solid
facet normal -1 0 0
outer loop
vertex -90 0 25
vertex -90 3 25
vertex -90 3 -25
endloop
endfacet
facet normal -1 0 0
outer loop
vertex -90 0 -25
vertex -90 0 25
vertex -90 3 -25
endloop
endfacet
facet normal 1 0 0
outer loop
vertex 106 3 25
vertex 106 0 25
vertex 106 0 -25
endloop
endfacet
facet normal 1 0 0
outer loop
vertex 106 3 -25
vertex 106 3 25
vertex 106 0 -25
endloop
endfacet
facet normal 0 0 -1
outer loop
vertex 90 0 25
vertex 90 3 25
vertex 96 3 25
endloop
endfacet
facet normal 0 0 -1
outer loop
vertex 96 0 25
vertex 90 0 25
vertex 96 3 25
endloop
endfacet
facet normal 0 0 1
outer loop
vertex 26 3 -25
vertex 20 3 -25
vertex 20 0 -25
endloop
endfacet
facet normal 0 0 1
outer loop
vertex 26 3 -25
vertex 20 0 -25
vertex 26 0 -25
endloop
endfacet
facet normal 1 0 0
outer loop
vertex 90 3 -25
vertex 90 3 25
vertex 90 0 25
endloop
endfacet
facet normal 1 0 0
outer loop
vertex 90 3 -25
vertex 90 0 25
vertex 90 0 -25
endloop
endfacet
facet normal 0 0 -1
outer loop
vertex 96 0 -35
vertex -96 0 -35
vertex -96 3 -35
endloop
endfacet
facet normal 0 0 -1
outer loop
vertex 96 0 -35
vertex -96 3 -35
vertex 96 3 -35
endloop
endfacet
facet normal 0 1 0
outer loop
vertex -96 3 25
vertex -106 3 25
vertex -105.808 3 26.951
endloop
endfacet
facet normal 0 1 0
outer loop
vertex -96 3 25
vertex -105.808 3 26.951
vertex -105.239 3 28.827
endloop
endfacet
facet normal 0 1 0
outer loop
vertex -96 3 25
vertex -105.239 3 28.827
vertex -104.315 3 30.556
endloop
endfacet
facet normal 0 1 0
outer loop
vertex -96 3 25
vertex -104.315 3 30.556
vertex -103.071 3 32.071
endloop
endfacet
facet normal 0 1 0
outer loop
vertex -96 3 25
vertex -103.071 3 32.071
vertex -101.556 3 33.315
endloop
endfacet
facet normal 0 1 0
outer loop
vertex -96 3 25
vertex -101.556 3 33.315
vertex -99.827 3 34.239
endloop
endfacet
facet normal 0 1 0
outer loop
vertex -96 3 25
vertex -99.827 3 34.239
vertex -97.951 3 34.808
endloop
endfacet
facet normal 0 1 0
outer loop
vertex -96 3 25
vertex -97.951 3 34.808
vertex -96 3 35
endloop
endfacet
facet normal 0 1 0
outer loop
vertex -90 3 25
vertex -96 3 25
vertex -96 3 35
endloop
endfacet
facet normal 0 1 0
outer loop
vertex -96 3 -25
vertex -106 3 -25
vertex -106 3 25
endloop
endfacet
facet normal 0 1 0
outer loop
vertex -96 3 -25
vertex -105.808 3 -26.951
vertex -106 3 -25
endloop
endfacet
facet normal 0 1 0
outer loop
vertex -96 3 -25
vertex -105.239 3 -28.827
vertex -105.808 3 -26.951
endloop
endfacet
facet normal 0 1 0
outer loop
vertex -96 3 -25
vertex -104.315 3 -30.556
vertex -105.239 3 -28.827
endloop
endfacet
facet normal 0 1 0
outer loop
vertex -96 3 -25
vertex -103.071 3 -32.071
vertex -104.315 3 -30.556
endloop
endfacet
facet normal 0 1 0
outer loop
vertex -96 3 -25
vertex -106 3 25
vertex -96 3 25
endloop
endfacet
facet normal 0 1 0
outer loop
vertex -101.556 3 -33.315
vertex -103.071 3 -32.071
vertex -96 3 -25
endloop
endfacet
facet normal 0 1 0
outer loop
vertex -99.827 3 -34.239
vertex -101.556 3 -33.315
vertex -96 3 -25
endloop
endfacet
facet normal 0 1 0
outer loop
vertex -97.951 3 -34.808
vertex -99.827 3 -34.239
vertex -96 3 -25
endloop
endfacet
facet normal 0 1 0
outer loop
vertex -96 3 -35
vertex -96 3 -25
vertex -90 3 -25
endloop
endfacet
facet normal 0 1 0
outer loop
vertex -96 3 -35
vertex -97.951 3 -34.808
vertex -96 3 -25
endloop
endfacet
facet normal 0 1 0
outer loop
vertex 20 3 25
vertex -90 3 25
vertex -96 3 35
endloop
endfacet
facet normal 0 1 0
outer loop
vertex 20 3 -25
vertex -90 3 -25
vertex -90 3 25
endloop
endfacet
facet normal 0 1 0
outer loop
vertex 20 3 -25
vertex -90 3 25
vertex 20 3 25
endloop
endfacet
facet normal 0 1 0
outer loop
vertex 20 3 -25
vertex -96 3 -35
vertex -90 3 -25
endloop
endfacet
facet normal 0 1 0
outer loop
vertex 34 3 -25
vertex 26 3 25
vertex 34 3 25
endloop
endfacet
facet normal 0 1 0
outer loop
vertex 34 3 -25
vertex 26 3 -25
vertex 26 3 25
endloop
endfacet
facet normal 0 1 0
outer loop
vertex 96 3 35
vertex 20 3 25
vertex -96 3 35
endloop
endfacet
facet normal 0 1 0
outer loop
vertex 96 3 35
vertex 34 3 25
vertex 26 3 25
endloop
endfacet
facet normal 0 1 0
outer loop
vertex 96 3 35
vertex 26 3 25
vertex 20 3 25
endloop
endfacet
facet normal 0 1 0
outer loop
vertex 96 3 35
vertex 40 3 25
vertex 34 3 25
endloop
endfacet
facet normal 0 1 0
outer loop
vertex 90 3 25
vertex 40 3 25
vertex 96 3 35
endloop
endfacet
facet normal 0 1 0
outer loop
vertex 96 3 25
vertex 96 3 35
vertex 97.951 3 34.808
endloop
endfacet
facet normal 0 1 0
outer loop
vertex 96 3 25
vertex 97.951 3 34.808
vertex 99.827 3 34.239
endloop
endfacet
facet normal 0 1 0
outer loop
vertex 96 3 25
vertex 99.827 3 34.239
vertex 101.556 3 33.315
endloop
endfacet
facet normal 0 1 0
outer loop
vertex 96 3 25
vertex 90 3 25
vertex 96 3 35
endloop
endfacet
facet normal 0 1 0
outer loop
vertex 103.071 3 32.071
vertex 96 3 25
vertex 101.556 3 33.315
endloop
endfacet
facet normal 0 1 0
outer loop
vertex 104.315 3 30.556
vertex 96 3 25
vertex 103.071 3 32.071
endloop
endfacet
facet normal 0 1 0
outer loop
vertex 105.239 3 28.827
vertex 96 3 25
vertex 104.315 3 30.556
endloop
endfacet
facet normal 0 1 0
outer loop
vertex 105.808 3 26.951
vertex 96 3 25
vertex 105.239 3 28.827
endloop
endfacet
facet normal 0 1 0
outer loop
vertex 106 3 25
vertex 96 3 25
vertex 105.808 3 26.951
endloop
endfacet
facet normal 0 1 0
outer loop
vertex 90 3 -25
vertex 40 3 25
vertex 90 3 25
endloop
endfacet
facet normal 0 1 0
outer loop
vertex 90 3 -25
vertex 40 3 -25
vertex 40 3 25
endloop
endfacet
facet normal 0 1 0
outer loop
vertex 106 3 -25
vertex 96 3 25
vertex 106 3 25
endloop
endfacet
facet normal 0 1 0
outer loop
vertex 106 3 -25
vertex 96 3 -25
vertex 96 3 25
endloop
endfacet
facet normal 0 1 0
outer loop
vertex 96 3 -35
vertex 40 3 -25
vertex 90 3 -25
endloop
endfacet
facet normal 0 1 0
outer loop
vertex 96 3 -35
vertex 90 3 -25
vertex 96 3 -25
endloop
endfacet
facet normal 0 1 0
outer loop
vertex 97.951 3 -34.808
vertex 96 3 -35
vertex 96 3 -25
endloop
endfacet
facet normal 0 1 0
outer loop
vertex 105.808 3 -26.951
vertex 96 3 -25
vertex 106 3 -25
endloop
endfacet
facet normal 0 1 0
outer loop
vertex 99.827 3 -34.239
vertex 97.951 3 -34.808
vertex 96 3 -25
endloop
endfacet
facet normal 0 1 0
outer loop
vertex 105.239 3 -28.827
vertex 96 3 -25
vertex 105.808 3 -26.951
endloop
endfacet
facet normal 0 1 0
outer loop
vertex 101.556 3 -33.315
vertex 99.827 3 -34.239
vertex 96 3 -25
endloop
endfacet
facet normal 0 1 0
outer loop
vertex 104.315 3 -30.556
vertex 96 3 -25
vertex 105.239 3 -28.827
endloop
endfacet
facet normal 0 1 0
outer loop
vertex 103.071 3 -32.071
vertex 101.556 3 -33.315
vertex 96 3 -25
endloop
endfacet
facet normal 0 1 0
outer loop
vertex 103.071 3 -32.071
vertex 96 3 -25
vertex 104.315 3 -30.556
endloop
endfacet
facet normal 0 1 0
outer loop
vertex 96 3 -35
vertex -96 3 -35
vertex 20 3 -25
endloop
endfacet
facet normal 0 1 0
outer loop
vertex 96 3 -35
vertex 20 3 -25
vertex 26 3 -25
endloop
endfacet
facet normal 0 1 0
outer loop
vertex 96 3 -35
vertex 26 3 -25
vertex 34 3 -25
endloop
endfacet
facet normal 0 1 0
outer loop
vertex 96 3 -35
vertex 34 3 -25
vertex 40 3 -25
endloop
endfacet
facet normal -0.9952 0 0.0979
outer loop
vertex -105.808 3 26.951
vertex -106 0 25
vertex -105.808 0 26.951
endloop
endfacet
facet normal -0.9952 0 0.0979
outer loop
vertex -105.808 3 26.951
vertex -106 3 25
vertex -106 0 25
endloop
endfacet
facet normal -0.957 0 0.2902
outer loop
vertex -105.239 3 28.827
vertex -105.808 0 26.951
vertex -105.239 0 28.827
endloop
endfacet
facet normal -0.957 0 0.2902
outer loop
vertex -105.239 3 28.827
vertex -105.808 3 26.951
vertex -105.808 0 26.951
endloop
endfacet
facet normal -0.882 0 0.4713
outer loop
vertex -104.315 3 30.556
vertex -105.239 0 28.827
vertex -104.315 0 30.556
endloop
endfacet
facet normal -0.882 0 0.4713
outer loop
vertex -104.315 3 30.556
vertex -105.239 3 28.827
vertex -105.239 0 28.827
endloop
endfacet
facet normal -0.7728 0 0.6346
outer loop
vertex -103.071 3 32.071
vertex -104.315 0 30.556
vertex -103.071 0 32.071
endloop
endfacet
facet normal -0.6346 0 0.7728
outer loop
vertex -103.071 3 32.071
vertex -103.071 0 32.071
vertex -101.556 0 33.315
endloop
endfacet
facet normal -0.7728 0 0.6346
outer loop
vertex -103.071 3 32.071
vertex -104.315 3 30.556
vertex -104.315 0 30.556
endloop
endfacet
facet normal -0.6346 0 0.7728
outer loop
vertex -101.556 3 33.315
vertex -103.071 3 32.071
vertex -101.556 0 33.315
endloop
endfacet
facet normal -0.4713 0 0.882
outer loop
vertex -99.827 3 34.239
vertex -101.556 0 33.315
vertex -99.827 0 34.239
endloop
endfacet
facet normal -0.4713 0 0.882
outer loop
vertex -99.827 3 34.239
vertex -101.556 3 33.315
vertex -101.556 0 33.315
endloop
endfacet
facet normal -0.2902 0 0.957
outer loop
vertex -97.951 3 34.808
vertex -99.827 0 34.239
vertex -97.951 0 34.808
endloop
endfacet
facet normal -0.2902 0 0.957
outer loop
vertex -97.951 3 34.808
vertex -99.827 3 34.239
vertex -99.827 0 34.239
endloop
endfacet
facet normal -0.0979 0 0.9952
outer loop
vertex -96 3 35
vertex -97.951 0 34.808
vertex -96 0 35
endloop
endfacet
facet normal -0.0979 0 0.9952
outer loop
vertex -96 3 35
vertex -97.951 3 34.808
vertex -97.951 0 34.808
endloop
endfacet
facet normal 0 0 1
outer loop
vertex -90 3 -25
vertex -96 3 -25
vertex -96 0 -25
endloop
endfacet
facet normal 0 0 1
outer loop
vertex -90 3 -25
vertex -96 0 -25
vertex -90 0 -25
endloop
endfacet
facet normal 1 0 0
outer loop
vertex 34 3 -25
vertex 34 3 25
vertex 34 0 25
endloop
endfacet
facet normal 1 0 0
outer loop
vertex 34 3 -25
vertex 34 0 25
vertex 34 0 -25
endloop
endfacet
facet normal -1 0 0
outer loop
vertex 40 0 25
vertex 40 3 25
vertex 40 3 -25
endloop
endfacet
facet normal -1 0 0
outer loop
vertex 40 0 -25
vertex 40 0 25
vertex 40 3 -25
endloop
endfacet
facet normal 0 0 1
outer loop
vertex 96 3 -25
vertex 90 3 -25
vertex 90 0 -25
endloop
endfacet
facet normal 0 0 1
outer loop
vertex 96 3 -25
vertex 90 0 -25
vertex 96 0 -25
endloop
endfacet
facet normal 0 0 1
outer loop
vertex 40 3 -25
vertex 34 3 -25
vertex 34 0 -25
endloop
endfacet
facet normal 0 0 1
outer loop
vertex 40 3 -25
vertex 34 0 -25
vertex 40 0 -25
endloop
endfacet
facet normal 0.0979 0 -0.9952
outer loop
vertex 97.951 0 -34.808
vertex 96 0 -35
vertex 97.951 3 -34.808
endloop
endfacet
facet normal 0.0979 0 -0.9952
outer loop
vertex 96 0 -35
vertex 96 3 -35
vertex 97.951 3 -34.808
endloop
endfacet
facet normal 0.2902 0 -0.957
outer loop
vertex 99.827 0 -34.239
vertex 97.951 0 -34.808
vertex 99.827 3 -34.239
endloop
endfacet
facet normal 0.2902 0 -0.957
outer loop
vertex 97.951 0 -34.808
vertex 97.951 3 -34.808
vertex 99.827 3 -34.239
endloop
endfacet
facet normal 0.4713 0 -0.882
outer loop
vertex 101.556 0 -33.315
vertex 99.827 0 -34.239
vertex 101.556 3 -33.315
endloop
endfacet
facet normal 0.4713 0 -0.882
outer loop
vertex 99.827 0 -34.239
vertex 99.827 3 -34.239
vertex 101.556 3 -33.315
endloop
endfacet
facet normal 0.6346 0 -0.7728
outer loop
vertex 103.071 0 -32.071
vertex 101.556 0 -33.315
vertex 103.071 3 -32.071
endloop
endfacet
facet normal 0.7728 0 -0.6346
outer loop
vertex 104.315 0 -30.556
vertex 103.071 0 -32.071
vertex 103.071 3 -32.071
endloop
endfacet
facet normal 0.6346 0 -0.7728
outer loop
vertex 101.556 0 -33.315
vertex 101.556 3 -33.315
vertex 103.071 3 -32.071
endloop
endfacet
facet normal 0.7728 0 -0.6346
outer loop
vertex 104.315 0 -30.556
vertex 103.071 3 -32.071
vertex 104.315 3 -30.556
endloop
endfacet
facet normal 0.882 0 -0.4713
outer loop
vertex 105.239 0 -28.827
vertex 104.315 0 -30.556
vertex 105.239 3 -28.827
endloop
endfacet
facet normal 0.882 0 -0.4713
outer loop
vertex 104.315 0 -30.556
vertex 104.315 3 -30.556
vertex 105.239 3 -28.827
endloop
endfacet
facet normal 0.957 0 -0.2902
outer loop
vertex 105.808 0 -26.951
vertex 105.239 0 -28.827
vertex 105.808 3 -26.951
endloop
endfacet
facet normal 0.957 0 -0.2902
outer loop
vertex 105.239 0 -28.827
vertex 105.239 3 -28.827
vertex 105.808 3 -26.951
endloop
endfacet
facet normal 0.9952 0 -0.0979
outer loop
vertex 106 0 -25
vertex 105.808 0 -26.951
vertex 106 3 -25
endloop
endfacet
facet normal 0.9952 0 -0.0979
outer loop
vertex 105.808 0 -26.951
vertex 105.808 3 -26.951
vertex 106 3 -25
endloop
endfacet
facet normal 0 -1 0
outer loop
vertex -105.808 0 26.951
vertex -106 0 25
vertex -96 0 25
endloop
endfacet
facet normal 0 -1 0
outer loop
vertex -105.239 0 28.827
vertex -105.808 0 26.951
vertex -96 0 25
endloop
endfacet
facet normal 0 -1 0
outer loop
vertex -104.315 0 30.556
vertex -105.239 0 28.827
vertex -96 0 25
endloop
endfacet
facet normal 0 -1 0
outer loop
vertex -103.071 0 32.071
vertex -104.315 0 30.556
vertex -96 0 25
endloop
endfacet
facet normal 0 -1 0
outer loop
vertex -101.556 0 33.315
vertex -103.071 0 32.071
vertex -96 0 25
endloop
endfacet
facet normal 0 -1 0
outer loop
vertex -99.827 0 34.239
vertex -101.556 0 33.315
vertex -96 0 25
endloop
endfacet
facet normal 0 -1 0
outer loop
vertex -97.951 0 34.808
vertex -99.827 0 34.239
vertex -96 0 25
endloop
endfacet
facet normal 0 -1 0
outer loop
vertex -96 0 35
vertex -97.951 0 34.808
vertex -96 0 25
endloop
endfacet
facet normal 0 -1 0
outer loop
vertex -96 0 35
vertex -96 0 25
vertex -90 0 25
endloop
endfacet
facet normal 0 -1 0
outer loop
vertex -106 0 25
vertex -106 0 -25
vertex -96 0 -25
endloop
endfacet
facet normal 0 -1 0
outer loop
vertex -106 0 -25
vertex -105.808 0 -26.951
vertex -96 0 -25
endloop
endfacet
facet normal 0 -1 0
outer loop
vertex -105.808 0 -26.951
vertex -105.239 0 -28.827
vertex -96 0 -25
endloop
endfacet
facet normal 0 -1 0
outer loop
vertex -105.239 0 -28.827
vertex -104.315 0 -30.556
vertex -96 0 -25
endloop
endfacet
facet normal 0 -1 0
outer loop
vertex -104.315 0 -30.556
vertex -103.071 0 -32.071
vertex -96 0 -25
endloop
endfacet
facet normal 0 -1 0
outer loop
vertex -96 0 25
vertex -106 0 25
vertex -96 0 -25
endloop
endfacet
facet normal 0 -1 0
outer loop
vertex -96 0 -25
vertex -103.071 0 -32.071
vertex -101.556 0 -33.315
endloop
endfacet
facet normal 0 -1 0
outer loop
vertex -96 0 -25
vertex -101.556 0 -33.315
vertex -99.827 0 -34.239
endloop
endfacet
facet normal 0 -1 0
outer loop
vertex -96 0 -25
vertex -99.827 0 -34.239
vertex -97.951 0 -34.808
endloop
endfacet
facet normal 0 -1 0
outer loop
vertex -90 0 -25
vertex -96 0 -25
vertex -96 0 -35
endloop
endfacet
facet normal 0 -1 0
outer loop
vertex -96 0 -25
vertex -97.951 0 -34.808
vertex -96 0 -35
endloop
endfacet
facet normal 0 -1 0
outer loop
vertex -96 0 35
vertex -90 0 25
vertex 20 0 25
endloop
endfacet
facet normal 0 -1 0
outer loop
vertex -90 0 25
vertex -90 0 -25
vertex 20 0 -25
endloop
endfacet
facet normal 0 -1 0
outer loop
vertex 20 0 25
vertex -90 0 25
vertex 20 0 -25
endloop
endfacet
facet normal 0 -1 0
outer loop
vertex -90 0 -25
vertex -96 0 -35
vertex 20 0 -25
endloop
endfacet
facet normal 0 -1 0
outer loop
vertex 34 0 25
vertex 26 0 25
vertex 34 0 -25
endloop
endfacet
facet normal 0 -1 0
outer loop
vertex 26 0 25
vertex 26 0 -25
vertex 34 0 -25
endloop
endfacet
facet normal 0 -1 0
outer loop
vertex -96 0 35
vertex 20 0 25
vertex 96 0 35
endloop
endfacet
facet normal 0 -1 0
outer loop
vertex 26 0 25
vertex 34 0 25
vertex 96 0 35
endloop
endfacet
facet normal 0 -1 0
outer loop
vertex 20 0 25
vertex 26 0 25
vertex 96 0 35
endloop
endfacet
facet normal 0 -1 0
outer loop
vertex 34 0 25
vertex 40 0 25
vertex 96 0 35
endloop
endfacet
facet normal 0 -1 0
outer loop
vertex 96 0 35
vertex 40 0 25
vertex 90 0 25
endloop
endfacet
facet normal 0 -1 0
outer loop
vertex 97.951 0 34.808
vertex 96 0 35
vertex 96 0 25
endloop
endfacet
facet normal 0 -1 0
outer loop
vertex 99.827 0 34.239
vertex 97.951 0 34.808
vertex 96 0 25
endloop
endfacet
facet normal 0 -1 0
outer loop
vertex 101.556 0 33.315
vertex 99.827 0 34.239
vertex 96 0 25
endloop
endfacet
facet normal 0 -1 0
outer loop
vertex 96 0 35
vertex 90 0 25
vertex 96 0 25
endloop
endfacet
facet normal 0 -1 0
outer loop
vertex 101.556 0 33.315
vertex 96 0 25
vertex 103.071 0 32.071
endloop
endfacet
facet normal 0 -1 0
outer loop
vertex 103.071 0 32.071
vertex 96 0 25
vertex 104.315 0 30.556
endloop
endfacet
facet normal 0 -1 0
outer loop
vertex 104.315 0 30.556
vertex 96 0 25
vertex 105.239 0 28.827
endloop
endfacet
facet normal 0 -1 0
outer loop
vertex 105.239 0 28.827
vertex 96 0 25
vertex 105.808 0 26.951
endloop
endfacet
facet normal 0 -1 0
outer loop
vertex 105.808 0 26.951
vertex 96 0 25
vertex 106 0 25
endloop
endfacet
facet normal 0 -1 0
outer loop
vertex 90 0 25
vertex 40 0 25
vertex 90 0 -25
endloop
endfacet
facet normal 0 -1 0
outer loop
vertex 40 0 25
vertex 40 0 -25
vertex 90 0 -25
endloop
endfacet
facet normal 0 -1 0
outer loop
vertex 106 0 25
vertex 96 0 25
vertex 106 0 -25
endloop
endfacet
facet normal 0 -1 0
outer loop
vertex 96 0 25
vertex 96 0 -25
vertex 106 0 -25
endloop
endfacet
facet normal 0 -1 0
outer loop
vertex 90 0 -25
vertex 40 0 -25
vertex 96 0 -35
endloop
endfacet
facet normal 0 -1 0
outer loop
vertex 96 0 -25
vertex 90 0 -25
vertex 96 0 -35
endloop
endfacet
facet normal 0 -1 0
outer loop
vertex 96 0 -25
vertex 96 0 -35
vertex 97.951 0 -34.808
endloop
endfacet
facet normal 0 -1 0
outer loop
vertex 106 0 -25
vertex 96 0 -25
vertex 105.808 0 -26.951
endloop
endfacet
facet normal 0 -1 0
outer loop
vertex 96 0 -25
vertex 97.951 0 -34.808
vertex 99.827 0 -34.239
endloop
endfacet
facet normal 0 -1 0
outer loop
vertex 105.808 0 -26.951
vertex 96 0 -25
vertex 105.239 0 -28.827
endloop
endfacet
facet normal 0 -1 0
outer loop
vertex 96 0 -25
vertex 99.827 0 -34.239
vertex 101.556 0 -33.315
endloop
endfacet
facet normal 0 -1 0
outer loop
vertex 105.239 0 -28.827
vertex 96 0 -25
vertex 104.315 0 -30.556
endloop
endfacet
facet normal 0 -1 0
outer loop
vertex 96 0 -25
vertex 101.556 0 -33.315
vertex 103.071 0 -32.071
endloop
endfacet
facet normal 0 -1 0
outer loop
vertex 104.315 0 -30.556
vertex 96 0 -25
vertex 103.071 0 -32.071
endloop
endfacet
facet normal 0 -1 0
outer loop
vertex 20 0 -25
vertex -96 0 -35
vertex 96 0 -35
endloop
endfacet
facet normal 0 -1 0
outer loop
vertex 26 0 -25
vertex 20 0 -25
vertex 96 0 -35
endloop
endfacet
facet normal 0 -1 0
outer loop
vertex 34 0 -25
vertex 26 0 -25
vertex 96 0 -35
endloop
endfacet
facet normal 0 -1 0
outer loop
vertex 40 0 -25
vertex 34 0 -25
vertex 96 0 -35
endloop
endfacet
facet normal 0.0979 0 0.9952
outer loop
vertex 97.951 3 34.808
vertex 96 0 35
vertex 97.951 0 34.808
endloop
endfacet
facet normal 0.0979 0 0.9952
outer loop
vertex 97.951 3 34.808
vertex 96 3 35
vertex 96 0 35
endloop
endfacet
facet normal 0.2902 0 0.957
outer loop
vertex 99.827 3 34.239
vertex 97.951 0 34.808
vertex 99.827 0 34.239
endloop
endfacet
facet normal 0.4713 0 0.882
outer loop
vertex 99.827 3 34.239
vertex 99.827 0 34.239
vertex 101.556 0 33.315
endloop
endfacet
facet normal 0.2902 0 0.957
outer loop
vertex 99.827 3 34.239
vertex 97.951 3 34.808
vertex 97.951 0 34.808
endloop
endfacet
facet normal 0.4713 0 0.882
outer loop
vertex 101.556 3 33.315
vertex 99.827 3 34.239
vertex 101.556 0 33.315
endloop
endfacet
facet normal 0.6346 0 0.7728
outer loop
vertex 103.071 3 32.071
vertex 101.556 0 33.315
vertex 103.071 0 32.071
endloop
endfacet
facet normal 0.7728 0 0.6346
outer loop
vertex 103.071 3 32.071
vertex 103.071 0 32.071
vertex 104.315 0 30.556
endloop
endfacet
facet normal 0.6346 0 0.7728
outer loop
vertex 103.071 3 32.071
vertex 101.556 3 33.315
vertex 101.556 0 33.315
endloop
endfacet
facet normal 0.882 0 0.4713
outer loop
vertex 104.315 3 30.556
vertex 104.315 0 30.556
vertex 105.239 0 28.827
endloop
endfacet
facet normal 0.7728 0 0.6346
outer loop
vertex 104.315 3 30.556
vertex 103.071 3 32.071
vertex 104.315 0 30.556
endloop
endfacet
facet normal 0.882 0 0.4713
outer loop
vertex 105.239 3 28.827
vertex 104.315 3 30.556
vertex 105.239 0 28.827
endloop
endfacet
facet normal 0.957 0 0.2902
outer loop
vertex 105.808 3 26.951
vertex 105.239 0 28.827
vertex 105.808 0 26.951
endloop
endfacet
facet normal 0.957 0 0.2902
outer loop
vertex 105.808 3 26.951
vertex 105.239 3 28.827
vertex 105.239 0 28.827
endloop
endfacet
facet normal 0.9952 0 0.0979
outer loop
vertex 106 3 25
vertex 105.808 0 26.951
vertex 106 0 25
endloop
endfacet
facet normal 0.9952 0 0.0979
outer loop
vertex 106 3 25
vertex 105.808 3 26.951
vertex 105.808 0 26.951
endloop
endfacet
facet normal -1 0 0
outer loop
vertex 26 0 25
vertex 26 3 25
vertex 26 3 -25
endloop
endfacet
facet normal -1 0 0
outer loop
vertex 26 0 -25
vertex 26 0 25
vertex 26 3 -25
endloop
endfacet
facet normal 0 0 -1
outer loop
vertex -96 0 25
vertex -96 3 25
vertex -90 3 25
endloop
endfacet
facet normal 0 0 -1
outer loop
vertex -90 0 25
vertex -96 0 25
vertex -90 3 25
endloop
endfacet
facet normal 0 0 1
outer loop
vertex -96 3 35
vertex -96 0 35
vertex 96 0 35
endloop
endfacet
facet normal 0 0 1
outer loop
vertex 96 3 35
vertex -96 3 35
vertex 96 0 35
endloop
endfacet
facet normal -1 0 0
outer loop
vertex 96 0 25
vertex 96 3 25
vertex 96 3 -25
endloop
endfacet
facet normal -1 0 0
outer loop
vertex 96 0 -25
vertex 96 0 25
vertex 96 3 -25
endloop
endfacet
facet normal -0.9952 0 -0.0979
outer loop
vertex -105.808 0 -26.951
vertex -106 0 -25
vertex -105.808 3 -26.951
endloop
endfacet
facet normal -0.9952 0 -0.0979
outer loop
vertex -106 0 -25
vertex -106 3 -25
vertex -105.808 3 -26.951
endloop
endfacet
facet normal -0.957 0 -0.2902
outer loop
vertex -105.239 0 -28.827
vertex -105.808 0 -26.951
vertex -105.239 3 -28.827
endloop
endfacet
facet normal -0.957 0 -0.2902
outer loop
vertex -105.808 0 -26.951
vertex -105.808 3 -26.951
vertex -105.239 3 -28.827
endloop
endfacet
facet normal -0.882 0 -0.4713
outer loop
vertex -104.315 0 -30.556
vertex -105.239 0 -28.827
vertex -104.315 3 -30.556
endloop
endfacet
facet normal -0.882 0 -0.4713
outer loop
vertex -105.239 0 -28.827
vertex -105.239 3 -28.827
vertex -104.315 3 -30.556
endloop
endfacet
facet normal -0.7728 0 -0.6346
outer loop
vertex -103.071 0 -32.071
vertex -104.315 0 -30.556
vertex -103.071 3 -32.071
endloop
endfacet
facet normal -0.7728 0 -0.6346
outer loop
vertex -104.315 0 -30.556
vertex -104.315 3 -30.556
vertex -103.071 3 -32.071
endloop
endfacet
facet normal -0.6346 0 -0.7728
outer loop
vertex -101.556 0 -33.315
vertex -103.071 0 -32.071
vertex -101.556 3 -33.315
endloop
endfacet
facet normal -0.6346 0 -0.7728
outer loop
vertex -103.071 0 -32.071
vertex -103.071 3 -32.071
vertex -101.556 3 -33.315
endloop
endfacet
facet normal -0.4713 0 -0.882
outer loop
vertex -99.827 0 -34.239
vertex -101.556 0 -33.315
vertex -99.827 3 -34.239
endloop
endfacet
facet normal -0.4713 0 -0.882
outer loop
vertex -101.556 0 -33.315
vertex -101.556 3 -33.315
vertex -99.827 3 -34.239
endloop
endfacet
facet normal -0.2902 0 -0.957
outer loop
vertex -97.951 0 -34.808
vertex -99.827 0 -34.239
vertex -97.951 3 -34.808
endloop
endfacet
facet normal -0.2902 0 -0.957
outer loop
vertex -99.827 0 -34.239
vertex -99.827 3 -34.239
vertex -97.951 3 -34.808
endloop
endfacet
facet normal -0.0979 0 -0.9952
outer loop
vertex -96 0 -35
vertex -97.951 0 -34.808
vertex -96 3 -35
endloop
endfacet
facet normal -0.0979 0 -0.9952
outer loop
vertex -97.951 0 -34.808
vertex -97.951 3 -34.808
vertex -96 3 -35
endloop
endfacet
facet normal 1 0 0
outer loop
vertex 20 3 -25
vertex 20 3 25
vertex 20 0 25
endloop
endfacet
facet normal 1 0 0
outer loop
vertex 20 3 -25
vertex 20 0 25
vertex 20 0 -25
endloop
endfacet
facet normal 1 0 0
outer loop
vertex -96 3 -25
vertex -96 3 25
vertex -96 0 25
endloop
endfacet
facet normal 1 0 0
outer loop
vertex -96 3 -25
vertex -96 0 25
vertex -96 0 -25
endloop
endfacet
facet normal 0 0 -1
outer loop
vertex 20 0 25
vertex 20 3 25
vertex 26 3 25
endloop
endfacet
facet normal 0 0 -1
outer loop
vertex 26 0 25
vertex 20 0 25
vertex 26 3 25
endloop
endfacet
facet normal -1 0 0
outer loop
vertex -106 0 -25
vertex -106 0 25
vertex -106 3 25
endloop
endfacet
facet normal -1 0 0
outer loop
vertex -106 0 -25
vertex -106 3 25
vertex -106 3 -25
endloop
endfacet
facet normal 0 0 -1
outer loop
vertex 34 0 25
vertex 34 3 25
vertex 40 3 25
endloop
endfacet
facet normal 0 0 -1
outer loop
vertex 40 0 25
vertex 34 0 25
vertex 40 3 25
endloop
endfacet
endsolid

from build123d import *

# Parameters (mm, degrees)
SKETCH1_W               = 212
SKETCH1_H               = 70
BOSS_EXTRUDE1_DEPTH     = 3
SKETCH2_W               = 6
SKETCH2_H               = 50
CUT_EXTRUDE1_DEPTH      = 1
CUT_EXTRUDE1_DEPTH_BACK = 4
FILLET1_R               = 10


with BuildPart() as part:
    # Sketch1 → Boss-Extrude1 (new body)
    with BuildSketch(Plane(origin=(0, 0, 0), x_dir=(1, 0, 0), z_dir=(0, 1, 0))):
        Rectangle(SKETCH1_W, SKETCH1_H)
    extrude(amount=BOSS_EXTRUDE1_DEPTH)

    # Sketch2 → Cut-Extrude1 (cut, two sides)
    with BuildSketch(Plane(origin=(0, 3, 0), x_dir=(1, 0, 0), z_dir=(0, 1, 0))) as cut_extrude1_sk:
        with Locations((23, 0)):
            Rectangle(SKETCH2_W, SKETCH2_H)
        with Locations((-93, 0)):
            Rectangle(SKETCH2_W, SKETCH2_H)
        with Locations((37, 0)):
            Rectangle(SKETCH2_W, SKETCH2_H)
        with Locations((93, 0)):
            Rectangle(SKETCH2_W, SKETCH2_H)
    extrude(amount=CUT_EXTRUDE1_DEPTH, mode=Mode.SUBTRACT)
    extrude(cut_extrude1_sk.sketch, amount=-CUT_EXTRUDE1_DEPTH_BACK, mode=Mode.SUBTRACT)

    # Fillet1
    fillet1_edges = [part.edges().sort_by_distance(p)[0] for p in [
        (106, 1.5, 35),
        (-106, 1.5, 35),
        (-106, 1.5, -35),
        (106, 1.5, -35),
    ]]
    fillet(fillet1_edges, radius=FILLET1_R)


solid = part.part
